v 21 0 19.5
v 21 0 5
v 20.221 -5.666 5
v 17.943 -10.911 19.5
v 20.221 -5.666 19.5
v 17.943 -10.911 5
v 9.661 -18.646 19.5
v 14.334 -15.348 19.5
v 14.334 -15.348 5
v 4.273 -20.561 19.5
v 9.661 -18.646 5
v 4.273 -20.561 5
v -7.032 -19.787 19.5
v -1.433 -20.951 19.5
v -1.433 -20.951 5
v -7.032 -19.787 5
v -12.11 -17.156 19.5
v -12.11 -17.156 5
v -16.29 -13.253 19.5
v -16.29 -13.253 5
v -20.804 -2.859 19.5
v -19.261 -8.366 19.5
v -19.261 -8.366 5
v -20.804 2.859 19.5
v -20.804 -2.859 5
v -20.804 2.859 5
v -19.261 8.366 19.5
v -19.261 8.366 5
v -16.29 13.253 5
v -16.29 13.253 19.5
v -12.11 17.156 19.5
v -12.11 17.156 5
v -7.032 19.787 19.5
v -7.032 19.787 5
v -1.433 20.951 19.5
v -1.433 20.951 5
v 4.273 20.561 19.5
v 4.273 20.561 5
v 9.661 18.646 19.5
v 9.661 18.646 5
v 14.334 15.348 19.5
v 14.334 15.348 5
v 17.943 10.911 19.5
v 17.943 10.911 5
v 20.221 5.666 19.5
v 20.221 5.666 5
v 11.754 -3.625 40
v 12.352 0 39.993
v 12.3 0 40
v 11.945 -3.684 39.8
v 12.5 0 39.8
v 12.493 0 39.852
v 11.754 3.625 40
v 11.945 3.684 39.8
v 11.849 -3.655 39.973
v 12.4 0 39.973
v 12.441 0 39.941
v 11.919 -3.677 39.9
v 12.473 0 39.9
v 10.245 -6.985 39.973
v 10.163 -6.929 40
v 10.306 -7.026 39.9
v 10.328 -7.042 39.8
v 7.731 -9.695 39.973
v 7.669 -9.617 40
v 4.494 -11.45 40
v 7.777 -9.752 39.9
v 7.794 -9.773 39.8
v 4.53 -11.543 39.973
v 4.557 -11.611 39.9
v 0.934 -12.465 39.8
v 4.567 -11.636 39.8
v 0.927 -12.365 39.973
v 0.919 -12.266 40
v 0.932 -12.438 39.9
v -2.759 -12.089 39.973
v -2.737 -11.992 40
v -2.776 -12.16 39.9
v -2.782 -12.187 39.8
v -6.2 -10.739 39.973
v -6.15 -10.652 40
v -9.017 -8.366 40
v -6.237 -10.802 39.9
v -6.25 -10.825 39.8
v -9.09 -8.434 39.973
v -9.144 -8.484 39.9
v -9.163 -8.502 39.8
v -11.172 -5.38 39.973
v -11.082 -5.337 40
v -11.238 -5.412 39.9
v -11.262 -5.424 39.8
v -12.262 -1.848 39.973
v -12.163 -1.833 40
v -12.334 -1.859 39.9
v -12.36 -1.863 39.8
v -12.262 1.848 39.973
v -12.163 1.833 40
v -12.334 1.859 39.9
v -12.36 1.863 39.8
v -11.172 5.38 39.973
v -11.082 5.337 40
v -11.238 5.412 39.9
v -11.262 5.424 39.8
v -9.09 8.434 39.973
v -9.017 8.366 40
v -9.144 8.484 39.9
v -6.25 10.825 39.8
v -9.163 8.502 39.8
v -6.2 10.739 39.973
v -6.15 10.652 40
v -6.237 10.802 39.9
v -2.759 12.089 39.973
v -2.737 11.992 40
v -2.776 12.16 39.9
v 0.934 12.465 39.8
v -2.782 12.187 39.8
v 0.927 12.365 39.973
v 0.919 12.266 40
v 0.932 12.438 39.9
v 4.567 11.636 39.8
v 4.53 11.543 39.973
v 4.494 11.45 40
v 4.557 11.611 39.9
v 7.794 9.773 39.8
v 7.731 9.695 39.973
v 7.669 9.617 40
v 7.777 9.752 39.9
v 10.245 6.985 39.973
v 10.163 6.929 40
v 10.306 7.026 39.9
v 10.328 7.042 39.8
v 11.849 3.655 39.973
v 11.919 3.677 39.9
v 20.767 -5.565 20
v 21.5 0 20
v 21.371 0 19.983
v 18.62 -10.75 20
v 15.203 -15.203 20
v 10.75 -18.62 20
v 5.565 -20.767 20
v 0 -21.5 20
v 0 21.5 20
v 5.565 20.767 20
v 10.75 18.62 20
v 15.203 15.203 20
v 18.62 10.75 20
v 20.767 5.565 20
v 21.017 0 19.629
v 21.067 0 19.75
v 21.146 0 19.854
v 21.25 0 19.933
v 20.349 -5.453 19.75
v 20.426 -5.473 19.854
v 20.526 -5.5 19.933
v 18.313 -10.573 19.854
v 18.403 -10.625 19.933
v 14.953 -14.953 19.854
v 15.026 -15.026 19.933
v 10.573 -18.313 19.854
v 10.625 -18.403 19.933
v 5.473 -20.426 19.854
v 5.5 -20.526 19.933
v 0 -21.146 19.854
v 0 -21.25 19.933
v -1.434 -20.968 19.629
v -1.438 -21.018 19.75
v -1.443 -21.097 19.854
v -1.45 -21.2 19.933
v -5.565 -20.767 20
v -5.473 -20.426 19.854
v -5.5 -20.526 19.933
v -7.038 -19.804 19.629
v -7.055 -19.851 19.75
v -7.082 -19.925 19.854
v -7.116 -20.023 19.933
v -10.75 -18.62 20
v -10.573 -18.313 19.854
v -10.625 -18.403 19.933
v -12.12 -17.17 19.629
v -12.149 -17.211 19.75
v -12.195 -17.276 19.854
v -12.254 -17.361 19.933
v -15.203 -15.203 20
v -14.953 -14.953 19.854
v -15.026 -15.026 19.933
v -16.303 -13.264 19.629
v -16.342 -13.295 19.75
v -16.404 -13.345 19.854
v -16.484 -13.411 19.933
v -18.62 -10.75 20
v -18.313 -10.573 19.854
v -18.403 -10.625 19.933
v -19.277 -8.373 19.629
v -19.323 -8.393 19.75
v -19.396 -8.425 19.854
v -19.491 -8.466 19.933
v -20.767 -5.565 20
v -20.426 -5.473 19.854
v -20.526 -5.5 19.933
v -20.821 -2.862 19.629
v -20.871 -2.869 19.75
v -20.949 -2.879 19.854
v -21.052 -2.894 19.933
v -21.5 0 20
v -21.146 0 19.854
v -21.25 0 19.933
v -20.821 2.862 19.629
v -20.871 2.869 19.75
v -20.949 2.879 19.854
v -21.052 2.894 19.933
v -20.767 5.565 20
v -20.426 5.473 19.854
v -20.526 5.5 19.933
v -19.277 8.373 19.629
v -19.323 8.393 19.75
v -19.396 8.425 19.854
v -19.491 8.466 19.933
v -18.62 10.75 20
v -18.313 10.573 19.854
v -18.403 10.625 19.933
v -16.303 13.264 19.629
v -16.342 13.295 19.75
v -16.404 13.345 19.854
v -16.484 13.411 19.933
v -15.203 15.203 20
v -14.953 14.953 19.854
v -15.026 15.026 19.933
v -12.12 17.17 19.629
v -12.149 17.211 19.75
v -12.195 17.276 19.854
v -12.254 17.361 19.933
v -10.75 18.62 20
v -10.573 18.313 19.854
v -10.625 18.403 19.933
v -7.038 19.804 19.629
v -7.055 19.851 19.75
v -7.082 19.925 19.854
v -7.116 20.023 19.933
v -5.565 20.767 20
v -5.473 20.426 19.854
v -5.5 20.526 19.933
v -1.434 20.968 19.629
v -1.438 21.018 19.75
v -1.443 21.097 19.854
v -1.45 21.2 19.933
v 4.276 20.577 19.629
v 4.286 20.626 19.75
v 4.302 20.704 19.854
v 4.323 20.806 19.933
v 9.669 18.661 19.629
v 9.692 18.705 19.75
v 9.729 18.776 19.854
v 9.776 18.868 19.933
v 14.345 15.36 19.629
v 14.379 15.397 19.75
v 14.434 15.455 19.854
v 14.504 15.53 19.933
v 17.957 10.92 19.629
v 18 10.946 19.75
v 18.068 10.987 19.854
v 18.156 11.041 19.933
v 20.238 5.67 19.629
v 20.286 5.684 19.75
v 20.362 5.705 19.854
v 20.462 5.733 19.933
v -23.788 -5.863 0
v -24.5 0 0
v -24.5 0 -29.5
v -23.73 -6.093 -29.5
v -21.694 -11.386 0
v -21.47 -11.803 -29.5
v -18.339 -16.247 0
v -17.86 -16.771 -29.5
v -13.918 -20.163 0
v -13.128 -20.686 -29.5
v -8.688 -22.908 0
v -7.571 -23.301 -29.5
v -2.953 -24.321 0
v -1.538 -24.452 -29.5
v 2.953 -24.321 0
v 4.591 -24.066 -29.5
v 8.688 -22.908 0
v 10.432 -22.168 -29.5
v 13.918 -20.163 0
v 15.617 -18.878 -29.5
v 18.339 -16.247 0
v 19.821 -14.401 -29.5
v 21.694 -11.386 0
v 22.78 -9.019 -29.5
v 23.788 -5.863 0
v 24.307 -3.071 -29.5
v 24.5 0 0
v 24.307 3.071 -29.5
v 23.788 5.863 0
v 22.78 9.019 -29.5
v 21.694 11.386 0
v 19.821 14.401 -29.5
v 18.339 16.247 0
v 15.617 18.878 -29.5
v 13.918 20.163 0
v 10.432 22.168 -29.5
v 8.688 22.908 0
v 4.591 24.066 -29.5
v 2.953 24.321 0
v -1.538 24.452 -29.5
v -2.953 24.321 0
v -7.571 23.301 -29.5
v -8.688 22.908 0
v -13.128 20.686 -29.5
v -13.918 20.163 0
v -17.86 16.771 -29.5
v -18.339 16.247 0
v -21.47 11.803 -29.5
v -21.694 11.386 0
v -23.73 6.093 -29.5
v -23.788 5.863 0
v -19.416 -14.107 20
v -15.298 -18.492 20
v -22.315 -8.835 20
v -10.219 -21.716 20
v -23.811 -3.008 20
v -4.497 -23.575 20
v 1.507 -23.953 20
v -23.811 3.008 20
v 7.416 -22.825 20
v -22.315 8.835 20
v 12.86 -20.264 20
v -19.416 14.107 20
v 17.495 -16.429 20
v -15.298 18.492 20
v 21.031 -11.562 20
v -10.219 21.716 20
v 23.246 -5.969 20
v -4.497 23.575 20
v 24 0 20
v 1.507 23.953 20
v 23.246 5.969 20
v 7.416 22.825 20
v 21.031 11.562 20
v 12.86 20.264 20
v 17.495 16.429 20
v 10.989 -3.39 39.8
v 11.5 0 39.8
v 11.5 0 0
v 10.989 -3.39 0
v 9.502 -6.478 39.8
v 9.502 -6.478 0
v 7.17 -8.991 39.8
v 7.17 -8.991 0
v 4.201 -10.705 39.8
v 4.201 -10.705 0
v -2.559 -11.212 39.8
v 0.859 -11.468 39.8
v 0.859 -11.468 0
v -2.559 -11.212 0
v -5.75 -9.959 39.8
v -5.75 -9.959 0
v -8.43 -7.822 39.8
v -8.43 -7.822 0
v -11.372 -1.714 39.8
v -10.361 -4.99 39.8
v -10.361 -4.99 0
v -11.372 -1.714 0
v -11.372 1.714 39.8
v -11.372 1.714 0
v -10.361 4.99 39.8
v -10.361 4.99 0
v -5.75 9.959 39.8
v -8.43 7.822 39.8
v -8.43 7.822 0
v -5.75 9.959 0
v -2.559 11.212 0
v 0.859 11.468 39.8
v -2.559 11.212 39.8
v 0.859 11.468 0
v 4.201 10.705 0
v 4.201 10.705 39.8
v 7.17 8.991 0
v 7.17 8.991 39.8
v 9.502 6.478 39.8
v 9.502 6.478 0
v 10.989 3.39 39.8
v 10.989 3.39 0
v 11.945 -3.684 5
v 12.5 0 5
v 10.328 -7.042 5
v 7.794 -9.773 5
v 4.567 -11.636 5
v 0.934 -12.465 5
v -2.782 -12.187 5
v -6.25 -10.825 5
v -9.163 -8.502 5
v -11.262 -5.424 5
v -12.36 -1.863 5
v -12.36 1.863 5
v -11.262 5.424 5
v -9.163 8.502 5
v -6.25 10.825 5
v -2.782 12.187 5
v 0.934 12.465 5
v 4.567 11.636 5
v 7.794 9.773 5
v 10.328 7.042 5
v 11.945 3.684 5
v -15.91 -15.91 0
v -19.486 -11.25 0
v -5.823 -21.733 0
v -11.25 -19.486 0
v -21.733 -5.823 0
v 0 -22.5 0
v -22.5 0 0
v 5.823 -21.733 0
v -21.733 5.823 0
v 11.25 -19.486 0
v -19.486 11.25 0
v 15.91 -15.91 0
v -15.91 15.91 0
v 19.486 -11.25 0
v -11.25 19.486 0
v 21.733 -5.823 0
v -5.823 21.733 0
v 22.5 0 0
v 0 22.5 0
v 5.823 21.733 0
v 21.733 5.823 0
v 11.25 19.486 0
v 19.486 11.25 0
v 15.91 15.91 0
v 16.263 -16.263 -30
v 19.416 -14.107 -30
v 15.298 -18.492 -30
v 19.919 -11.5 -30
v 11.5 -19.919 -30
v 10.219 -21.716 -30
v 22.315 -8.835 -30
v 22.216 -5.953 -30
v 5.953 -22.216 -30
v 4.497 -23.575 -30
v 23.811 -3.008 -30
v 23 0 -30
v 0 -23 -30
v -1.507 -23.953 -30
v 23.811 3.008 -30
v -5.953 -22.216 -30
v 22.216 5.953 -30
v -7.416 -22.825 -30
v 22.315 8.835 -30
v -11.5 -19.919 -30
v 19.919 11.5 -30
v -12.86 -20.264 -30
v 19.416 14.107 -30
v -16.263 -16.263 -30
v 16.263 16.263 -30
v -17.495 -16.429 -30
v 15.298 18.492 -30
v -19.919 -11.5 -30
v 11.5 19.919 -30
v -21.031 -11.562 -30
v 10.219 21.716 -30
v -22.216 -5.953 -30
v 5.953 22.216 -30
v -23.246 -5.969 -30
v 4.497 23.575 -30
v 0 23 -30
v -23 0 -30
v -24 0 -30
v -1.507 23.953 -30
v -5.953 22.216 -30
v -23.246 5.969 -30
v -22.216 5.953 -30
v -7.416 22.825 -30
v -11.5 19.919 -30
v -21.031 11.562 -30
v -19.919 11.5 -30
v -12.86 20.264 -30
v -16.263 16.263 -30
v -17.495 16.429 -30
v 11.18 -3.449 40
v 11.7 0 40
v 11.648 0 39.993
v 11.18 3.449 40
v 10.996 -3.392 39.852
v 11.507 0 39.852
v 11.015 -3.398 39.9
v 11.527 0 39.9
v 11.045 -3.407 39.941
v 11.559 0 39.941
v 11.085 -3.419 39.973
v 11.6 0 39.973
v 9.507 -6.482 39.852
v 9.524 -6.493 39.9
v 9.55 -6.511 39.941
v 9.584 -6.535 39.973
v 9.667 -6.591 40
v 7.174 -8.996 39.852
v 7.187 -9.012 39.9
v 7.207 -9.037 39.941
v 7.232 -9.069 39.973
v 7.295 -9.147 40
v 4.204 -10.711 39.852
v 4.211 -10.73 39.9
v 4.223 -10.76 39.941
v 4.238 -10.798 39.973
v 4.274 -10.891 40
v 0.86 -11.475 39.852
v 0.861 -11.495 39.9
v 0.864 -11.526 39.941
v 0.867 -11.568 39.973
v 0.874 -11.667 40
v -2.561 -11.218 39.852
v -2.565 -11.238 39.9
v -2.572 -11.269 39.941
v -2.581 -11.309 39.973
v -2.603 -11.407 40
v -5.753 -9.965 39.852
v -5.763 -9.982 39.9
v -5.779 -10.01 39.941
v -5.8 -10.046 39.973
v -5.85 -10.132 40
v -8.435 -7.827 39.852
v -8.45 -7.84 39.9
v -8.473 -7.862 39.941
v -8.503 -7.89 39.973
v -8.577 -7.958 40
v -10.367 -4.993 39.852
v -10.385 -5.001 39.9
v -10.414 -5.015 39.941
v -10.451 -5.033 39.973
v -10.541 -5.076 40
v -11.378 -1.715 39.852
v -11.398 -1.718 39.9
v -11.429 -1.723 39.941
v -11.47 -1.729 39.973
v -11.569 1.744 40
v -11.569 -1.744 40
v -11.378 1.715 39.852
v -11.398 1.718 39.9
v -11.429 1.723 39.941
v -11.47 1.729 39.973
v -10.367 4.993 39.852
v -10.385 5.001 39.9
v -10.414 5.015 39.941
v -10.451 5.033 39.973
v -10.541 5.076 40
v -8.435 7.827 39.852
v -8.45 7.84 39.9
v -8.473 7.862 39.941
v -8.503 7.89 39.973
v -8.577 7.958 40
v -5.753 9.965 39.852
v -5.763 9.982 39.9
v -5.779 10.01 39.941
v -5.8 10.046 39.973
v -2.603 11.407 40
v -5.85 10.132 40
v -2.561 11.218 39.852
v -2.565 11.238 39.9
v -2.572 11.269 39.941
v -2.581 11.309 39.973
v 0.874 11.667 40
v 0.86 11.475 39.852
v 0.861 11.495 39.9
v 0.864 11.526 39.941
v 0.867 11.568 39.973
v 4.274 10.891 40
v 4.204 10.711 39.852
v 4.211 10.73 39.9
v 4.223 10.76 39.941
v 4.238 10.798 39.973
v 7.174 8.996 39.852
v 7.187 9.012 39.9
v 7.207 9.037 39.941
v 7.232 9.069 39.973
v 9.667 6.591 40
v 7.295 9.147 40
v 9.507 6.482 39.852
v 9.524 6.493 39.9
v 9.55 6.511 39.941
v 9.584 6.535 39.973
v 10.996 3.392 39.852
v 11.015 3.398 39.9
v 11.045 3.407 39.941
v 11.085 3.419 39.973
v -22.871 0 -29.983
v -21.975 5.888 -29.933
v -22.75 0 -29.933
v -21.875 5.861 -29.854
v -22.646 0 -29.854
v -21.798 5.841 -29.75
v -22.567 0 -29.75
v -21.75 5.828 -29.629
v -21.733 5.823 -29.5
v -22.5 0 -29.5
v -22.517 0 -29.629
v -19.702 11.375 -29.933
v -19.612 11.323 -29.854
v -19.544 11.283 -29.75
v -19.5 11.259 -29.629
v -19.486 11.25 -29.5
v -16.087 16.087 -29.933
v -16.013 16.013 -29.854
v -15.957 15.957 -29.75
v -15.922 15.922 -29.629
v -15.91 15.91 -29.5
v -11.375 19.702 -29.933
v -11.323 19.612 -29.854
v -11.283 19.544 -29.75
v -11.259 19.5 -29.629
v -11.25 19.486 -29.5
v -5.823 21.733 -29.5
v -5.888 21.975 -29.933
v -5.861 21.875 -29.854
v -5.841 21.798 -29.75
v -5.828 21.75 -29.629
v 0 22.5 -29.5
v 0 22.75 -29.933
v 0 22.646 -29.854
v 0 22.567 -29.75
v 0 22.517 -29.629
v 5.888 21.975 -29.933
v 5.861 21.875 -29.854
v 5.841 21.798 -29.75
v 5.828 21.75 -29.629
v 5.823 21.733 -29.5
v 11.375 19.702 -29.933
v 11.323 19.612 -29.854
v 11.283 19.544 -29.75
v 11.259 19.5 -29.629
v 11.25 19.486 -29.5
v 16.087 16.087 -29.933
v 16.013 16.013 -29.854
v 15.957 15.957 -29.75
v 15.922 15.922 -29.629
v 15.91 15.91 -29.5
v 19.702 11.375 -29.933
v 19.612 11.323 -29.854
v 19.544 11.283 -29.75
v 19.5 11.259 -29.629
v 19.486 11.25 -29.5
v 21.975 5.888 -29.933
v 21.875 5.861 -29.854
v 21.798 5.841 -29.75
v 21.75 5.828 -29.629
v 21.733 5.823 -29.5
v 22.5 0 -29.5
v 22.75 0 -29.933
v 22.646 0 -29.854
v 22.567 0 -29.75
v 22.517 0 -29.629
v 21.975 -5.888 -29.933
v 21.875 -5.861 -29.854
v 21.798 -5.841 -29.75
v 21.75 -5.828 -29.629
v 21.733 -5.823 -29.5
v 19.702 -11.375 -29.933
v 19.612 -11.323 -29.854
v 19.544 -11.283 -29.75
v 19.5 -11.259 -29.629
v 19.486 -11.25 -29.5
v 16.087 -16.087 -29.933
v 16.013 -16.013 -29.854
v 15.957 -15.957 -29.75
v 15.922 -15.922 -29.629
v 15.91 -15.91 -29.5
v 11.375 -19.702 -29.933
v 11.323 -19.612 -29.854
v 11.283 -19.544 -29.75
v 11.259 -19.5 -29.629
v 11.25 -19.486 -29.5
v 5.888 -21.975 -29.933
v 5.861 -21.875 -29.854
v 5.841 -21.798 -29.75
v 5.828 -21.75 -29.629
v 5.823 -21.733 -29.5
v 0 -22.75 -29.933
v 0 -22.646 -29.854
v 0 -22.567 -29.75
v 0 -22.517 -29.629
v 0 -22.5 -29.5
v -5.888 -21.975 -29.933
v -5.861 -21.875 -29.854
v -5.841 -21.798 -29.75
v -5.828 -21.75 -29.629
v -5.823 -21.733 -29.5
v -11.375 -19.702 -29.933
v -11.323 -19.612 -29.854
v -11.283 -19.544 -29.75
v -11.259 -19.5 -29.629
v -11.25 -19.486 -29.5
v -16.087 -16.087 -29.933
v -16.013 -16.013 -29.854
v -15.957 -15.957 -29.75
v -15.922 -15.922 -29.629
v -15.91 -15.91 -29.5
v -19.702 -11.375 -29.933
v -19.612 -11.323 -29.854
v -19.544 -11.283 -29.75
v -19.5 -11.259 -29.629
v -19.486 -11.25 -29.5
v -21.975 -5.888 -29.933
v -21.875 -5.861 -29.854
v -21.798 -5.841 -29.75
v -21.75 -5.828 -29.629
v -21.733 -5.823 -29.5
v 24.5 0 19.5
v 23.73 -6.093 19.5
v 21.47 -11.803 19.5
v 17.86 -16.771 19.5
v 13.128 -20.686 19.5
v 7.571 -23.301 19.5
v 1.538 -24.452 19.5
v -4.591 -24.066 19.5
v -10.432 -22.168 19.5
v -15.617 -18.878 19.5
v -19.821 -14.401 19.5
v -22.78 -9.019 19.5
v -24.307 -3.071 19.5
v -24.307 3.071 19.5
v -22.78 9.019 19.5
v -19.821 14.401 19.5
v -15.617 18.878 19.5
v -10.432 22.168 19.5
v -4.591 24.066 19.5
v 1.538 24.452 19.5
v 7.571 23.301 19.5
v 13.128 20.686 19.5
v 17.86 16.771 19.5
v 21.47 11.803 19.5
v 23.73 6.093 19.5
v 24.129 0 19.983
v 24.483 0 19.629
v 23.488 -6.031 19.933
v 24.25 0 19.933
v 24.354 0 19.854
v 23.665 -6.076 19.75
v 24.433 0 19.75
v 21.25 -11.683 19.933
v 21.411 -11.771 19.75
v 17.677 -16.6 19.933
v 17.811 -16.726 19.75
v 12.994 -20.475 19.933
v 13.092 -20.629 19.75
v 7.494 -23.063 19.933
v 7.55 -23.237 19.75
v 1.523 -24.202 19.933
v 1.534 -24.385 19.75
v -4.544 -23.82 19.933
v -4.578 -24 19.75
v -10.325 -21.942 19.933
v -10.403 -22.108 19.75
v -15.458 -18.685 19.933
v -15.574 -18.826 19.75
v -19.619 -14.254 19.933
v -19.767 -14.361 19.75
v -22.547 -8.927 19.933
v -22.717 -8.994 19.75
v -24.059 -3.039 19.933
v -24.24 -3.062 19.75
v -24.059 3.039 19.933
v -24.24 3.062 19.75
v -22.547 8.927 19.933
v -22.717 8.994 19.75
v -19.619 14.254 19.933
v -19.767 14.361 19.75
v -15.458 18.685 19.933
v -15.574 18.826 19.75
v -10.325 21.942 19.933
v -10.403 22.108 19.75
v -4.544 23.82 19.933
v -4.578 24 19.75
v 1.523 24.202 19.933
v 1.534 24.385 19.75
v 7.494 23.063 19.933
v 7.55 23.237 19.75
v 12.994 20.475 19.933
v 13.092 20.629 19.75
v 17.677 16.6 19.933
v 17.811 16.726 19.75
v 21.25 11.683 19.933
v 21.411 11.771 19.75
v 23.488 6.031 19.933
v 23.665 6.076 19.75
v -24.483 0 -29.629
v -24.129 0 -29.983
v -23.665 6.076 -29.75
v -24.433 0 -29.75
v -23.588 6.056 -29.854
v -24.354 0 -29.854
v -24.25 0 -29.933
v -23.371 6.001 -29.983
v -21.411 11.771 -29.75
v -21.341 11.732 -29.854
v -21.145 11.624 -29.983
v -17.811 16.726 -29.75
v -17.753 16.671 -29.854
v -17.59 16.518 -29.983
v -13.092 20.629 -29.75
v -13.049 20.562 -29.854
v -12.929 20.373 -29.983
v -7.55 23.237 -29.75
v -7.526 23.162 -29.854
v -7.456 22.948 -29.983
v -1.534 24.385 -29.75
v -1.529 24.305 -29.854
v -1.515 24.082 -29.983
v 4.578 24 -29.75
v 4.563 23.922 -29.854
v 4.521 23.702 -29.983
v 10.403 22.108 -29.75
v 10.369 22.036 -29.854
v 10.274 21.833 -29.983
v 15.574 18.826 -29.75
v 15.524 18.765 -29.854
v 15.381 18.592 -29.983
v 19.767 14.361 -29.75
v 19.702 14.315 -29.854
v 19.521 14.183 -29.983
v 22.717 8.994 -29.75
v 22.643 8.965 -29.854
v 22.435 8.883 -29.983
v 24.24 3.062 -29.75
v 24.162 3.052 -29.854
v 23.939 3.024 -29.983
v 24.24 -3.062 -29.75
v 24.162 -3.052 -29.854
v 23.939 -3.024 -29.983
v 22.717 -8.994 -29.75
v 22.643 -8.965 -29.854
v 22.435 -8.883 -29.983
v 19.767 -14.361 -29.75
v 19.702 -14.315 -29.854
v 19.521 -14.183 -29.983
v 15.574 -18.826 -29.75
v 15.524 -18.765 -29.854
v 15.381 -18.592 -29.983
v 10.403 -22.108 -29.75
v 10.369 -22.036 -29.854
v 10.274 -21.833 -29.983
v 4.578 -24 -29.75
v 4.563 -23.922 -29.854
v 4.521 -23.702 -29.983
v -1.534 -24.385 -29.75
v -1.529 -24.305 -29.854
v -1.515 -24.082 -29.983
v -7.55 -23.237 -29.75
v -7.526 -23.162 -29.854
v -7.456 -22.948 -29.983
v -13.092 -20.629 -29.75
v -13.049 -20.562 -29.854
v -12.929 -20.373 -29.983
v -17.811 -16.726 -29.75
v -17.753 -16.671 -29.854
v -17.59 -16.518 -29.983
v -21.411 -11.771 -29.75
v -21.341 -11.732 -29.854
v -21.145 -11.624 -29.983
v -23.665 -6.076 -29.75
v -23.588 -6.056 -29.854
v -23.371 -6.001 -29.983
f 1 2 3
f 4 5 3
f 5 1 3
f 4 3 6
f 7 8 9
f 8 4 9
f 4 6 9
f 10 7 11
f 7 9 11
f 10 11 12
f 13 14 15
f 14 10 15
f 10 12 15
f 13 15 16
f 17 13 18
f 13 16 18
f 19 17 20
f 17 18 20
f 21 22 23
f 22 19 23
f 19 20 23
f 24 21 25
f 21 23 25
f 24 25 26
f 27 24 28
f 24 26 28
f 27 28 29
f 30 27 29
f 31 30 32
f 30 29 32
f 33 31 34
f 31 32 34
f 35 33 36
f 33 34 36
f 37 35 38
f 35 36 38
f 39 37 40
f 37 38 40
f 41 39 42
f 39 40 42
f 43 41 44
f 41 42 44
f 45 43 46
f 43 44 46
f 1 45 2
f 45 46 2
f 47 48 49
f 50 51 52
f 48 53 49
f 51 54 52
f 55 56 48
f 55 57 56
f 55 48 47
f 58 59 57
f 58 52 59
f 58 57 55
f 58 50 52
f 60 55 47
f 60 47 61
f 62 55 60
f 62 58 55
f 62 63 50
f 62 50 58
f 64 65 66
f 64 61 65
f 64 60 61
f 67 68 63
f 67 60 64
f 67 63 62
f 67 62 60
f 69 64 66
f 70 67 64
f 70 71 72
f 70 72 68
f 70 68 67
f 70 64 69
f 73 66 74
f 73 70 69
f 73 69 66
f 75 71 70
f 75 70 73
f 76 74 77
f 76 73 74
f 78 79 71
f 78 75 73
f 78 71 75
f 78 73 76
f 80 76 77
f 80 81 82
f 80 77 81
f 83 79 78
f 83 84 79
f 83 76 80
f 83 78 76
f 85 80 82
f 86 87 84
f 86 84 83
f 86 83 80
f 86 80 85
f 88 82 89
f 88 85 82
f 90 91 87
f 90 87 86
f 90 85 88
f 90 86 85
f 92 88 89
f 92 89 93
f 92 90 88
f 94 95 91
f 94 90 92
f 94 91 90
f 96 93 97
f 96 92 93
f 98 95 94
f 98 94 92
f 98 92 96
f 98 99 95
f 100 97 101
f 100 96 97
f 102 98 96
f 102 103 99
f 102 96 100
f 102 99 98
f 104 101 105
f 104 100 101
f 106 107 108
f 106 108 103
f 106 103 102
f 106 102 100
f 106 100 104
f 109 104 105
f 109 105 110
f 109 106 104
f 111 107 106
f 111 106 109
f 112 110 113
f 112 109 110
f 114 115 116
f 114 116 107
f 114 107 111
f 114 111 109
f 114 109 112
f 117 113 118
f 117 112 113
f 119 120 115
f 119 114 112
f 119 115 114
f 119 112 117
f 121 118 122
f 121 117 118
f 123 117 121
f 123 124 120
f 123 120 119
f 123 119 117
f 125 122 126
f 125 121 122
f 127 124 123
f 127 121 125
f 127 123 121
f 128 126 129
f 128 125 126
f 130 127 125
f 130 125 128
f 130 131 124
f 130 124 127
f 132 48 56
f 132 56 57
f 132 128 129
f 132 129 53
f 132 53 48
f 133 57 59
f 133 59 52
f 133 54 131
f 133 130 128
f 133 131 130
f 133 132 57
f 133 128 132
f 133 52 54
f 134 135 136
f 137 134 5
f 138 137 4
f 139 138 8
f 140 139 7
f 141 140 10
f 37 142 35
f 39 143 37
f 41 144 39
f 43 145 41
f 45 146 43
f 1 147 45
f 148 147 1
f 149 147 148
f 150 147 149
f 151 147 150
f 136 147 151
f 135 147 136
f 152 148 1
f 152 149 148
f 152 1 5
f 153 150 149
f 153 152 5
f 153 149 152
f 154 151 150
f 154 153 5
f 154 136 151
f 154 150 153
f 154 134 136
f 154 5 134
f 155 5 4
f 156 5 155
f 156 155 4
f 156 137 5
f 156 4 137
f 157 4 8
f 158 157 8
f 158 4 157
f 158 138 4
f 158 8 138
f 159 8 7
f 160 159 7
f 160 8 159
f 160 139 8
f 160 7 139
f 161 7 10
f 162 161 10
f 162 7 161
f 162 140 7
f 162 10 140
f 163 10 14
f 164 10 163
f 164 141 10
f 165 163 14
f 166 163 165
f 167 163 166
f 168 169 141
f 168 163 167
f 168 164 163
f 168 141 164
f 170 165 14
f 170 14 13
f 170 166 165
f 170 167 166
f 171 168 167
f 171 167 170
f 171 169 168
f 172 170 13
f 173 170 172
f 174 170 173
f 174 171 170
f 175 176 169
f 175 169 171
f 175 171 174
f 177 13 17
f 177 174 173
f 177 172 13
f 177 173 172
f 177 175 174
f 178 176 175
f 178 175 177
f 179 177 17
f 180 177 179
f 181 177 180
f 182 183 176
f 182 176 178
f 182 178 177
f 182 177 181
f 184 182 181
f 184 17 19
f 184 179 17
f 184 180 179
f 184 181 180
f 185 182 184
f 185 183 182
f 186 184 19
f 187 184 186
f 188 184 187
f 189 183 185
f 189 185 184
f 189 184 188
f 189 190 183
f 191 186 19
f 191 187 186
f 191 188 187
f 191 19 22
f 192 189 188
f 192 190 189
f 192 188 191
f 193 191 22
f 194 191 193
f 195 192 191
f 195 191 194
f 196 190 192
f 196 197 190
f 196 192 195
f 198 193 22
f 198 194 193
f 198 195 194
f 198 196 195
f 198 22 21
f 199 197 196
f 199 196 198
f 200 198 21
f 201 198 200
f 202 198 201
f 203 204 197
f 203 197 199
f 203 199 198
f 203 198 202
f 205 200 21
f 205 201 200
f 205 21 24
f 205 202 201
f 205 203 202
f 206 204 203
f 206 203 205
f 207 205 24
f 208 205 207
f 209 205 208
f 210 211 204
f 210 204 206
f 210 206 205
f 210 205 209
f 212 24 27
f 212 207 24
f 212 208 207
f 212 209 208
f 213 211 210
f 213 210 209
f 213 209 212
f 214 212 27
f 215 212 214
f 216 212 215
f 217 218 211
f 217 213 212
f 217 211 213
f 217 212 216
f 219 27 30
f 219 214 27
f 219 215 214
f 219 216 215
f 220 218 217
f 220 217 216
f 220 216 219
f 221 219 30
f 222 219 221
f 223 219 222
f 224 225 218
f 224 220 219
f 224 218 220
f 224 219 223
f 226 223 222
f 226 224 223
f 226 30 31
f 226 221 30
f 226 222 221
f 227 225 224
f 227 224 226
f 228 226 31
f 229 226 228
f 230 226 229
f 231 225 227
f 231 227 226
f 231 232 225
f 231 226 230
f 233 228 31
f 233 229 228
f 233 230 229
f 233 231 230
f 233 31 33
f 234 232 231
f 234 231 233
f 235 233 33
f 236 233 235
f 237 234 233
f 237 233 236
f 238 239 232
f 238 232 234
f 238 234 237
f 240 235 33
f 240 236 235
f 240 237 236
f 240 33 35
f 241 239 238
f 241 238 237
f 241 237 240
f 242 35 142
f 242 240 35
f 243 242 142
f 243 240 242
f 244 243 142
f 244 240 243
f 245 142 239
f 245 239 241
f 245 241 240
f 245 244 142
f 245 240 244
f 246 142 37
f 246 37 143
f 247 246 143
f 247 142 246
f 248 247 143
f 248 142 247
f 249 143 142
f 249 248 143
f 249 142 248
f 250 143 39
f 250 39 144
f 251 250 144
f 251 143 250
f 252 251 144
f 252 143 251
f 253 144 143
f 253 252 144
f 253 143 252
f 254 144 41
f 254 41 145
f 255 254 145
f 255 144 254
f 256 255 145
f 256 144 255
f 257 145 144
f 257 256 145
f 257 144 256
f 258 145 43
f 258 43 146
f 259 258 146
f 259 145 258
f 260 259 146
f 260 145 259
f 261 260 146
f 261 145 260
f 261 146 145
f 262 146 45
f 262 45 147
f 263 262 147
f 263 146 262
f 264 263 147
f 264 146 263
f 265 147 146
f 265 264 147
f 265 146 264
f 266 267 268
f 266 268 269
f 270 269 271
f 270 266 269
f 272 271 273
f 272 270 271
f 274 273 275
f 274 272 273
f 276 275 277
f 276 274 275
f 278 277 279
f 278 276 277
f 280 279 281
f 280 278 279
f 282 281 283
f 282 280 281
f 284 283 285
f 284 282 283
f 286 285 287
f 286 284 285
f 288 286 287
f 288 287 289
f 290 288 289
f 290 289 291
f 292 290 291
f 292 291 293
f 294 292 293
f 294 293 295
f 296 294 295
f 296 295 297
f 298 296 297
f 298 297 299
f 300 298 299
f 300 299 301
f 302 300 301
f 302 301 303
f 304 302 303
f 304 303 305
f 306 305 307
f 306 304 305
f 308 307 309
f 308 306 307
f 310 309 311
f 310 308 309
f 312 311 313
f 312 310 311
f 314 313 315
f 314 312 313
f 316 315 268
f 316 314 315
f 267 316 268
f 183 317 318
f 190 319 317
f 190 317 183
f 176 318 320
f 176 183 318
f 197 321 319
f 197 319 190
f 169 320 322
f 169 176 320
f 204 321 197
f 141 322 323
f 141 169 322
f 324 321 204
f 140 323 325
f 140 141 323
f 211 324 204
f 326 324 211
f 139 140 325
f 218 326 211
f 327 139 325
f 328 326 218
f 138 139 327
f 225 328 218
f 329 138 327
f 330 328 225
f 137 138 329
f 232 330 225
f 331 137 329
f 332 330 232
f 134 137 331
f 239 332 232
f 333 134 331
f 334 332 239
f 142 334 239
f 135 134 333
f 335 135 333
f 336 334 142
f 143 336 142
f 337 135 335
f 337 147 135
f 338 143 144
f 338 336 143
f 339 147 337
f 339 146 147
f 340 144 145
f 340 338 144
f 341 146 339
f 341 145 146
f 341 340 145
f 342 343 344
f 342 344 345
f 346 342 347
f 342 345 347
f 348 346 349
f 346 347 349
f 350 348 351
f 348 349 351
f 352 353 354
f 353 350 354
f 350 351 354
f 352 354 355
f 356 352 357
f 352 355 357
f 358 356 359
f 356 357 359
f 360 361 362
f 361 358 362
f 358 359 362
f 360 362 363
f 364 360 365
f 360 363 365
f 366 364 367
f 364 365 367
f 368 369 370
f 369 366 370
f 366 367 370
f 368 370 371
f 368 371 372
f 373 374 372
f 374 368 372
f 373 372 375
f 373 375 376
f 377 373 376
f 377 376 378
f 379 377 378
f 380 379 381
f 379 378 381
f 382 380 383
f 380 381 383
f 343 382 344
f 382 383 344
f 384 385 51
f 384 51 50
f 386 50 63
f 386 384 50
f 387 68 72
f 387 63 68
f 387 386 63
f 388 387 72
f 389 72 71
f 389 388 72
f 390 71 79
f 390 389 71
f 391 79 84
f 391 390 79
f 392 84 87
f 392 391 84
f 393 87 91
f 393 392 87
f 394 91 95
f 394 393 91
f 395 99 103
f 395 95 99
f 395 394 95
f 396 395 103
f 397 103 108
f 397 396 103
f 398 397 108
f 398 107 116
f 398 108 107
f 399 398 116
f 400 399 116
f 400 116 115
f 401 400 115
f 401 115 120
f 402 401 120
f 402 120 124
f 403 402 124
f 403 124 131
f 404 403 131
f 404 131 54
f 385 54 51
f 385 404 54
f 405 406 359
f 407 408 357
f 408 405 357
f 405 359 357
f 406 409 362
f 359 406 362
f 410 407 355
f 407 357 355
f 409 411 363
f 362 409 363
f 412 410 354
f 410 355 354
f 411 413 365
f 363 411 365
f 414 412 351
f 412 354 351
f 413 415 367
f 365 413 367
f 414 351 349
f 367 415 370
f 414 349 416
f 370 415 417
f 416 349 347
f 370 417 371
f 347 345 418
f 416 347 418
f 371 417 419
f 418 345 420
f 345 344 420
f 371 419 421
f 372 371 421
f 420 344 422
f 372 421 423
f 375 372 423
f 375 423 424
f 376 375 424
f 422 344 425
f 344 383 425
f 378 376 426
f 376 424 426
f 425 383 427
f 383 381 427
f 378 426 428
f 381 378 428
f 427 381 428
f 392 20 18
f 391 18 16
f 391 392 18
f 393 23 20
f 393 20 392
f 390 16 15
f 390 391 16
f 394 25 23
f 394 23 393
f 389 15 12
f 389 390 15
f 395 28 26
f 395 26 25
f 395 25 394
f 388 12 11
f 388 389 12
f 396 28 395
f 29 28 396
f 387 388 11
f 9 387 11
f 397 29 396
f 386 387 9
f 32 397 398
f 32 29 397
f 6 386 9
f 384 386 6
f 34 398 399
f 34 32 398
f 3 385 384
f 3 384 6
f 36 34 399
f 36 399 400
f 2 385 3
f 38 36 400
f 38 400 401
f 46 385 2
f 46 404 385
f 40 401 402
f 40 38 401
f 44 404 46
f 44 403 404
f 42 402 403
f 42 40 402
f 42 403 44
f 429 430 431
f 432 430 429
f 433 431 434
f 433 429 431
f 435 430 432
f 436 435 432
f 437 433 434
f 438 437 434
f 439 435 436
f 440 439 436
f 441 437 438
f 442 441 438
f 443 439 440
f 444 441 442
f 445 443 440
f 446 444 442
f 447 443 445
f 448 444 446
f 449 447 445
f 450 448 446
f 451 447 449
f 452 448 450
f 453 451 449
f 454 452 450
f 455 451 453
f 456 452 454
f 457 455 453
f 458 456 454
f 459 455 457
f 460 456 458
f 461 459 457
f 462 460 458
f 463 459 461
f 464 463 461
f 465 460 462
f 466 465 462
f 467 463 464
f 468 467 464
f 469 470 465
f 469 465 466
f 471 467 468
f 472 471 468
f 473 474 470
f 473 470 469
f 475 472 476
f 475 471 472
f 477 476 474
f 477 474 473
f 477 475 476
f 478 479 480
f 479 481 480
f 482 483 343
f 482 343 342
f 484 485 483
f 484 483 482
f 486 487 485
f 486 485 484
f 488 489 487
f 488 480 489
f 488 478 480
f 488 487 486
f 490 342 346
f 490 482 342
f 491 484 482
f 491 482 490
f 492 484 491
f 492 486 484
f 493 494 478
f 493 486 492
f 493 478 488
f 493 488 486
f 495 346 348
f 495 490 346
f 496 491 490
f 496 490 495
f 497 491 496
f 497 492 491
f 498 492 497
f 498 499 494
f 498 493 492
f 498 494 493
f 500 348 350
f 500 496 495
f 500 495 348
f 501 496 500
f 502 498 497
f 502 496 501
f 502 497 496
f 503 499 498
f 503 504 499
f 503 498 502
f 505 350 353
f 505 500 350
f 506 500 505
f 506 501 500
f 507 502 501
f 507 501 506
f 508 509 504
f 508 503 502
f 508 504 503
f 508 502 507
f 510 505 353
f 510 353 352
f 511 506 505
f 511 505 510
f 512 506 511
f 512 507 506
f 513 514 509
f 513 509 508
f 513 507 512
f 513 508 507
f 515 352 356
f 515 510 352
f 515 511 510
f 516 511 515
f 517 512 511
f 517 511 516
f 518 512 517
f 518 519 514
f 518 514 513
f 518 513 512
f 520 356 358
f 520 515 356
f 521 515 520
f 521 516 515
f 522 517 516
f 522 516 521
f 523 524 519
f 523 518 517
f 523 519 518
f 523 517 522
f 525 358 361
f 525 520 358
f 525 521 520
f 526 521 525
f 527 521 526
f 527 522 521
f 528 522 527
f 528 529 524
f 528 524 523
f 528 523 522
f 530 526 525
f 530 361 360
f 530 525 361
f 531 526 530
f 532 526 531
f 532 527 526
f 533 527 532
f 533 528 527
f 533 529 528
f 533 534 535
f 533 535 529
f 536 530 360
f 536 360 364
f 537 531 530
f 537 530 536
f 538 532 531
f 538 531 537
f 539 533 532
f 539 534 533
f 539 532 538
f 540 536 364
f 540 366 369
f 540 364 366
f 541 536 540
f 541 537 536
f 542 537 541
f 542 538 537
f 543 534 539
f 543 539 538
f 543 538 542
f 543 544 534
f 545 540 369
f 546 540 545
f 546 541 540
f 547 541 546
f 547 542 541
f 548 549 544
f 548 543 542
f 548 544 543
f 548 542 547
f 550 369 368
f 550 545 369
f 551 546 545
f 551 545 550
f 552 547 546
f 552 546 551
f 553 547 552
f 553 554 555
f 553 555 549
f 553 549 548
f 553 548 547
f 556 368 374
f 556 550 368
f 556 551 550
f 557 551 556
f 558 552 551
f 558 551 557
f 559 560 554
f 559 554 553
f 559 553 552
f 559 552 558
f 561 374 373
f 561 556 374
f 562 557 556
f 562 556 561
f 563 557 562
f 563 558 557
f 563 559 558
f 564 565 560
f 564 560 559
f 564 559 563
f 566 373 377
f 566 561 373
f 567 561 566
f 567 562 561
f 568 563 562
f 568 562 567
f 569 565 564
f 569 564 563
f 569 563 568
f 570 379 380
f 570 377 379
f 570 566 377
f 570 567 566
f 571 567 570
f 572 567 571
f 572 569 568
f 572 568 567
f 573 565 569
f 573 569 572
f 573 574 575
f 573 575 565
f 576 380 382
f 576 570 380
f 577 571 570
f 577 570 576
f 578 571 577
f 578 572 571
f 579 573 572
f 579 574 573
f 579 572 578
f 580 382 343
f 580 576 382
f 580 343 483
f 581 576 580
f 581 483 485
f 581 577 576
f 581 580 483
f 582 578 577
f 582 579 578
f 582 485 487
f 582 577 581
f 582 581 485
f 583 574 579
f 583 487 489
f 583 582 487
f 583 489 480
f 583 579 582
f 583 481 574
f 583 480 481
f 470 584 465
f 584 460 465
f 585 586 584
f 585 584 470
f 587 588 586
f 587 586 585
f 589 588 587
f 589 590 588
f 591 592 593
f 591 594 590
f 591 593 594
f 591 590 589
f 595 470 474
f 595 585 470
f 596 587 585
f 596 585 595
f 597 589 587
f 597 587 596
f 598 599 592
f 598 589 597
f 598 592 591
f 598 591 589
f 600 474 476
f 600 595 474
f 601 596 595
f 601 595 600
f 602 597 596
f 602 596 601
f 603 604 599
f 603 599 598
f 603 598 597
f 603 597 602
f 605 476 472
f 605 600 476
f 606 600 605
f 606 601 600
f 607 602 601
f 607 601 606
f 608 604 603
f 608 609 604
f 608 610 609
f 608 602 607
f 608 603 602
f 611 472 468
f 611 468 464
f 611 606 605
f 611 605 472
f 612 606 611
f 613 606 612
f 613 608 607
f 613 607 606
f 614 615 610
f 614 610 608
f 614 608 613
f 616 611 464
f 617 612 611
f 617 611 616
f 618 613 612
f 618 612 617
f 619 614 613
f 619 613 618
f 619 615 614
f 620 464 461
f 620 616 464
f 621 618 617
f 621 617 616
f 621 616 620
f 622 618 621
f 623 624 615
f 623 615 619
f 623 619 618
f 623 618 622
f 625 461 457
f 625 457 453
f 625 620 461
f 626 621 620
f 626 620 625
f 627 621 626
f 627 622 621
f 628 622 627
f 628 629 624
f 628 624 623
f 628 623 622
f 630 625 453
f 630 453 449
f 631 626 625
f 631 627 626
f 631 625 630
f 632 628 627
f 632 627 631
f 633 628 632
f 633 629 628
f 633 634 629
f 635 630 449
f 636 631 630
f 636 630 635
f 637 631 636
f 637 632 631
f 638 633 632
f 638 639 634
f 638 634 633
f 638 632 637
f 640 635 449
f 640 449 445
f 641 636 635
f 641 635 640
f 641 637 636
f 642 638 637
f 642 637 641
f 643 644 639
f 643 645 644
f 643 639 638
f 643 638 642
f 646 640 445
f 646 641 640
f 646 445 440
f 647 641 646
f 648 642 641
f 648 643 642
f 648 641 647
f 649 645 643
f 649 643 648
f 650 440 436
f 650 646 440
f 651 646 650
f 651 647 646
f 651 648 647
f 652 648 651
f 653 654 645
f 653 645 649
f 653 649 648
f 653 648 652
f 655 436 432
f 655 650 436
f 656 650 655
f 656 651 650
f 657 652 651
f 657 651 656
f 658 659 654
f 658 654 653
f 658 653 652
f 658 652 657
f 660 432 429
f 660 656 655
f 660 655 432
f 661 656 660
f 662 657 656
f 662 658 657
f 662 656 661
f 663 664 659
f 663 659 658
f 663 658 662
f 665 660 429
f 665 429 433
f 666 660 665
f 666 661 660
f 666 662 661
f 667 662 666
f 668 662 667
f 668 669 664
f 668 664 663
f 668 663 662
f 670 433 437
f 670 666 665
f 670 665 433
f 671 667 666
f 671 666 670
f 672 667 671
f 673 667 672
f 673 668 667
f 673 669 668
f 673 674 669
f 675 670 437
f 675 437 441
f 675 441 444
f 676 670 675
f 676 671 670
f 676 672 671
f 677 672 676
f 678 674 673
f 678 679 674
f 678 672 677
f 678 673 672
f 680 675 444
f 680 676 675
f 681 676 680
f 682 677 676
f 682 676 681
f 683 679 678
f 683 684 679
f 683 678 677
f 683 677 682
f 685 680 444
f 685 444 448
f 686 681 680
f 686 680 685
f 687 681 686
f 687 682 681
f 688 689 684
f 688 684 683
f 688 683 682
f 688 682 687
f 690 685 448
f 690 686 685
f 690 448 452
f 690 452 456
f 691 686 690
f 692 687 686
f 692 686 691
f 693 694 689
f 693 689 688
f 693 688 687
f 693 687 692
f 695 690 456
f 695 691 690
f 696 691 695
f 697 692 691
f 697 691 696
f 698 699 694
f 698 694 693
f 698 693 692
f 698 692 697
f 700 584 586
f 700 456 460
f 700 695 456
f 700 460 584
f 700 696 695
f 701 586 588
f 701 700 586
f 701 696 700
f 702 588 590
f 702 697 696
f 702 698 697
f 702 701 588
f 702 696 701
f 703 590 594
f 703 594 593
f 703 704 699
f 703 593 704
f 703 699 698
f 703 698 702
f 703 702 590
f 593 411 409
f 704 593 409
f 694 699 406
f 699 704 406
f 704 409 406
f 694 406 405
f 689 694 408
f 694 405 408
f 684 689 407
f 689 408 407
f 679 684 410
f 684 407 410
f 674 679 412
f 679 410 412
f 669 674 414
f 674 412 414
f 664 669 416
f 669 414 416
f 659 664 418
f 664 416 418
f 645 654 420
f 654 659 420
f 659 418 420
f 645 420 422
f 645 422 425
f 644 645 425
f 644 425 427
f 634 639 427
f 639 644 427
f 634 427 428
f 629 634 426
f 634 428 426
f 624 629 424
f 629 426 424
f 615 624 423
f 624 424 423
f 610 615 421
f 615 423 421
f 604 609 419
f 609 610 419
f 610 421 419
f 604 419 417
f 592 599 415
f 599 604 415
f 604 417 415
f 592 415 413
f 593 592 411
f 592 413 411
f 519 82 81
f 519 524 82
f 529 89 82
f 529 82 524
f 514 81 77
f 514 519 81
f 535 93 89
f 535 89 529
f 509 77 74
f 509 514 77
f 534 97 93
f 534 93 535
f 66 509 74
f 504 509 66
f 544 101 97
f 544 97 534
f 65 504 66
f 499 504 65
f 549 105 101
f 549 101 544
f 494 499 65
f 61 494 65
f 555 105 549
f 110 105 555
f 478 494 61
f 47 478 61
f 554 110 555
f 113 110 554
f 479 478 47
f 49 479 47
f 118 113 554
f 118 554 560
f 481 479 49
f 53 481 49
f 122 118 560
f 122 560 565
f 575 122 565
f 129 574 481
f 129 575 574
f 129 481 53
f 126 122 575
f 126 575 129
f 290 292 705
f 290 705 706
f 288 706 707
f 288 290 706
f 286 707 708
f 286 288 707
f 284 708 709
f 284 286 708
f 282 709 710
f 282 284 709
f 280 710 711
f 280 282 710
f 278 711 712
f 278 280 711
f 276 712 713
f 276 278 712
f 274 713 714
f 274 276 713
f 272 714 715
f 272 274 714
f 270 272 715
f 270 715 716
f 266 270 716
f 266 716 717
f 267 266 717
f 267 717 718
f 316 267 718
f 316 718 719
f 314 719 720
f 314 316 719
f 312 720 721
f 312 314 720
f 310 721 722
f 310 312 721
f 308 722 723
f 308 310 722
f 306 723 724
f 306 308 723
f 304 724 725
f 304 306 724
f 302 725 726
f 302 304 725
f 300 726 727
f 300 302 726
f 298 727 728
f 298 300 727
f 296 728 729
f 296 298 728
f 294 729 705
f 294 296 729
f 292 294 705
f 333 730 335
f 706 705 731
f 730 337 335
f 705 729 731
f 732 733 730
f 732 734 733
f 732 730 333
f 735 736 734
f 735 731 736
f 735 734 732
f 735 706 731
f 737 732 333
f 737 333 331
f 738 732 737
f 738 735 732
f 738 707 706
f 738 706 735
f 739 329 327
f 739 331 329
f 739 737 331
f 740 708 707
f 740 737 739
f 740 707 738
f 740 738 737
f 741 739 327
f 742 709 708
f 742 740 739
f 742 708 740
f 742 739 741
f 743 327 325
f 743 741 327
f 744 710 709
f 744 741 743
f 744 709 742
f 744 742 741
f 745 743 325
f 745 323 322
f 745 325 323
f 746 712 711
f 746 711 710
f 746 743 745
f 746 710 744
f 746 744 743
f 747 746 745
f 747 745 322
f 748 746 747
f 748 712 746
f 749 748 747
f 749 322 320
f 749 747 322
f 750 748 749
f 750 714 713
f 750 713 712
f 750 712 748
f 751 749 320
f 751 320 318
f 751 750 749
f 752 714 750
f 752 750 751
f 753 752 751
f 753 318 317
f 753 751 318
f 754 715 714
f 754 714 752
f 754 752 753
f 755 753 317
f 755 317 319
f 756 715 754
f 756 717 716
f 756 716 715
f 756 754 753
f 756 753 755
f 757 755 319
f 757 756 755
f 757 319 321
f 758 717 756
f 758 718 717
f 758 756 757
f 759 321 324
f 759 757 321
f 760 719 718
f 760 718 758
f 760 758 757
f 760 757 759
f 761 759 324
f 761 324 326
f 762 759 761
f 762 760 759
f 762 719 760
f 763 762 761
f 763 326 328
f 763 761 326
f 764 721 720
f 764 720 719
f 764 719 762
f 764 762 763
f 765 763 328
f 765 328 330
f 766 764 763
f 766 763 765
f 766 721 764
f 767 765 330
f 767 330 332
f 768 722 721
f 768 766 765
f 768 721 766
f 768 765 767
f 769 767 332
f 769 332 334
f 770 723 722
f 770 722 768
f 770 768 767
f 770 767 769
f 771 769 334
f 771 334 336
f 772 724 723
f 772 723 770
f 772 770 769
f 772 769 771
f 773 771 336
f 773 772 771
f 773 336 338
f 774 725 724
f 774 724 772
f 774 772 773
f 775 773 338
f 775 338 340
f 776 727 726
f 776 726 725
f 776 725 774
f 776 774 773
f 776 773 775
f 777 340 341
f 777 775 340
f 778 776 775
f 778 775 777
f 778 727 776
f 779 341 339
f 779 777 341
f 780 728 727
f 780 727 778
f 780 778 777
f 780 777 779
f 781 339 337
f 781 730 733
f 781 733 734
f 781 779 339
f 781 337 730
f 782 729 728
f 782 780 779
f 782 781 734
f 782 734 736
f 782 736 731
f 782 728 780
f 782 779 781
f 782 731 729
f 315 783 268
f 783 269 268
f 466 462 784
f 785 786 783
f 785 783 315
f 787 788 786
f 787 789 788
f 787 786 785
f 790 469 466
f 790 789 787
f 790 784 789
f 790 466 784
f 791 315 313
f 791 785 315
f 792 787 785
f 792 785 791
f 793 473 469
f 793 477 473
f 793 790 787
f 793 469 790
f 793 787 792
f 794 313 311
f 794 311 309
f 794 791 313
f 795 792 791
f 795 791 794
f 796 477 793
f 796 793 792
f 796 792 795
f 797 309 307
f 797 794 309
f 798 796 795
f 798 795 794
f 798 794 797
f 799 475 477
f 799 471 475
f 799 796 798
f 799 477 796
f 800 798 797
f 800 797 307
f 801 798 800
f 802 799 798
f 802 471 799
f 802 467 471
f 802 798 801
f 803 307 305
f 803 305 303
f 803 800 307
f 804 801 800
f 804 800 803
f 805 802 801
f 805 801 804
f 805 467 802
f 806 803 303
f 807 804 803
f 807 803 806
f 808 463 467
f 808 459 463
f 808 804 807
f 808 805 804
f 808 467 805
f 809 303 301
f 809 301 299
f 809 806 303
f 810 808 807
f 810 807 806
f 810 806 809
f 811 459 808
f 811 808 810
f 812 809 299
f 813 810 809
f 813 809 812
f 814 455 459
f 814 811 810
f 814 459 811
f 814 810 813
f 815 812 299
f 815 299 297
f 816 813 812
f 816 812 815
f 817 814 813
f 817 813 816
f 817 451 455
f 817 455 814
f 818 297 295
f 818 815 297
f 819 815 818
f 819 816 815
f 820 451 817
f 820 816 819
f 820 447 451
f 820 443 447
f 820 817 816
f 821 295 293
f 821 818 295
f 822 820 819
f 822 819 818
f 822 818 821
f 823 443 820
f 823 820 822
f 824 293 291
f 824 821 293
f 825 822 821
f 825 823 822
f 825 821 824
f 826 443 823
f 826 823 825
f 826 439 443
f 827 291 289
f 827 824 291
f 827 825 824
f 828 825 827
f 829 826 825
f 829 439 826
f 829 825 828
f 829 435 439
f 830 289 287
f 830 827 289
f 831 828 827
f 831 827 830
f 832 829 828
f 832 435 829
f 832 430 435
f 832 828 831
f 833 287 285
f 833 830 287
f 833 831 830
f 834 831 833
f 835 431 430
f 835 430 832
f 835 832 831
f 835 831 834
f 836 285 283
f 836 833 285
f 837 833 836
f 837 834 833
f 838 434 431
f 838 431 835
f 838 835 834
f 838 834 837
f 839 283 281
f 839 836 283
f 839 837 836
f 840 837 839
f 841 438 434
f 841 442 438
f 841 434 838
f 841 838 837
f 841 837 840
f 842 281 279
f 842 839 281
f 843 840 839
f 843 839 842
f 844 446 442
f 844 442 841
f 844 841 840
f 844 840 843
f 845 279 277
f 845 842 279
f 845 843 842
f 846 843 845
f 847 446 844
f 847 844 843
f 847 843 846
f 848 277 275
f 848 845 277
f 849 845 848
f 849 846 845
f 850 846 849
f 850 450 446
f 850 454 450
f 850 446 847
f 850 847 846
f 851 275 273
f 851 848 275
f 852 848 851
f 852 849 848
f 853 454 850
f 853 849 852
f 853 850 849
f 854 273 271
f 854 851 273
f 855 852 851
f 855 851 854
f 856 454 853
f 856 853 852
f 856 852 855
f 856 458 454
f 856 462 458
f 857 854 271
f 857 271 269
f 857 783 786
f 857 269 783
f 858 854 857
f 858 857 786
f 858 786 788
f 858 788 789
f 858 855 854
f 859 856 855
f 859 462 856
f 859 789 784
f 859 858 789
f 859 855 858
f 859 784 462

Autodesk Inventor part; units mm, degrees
ref_plane "YZ Plane" through (0, 0, 0) normal (1, 0, 0) x (0, 1, 0)
ref_plane "XZ Plane" through (0, 0, 0) normal (0, 1, 0) x (-1, 0, 0)
ref_plane "XY Plane" through (0, 0, 0) normal (0, 0, 1) x (1, 0, 0)
sketch "Sketch1" plane through (0, 0, 0) normal (0, 0, 1) x (1, 0, 0)
  circle A0 centre (0, 0) radius 12.5
  circle A1 centre (0, 0) radius 11.5
  circle A2 centre (0, 0) radius 24.5
  circle A3 centre (0, 0) radius 21
  dimension "d0" = 25
  dimension "d1" = 23
  dimension "d2" = 49
  dimension "d3" = 42
extrude "Extrusion1" add sketch "Sketch1" along normal blind 40 contours A0
extrude "Extrusion2" add sketch "Sketch1" along normal blind 20 contours A2
extrude "Extrusion3" add sketch "Sketch1" along normal blind 5 contours A3
fillet "Fillet1" radius 0.5 2 edges at (-21, 0, 20) (-24.5, 0, 20)
sketch "Sketch2" plane through (0, 0, 0) normal (0, 0, -1) x (-1, 0, 0)
  circle A0 centre (0, 0) radius 24.5
  circle A1 centre (0, 0) radius 22.5
  dimension "d11" = 49
  dimension "d12" = 45
extrude "Extrusion4" add sketch "Sketch2" along normal blind 30
fillet "Fillet2" radius 0.5 2 edges at (24.5, 0, -30) (22.5, 0, -30)
fillet "Fillet3" radius 0.2 2 edges at (-12.5, 0, 40) (-11.5, 0, 40)
equation "\"BendRadius\" = Thickness"
equation "\"BendReliefWidth\" = Thickness"
equation "\"BendReliefDepth\" = 0.5 * Thickness"
equation "\"CornerReliefSize\" = 4 * Thickness"
equation "\"MinimumRemnant\" = 2 * Thickness"
equation "\"TransitionRadius\" = BendRadius"
equation "\"JacobiRadiusSize\" = BendRadius"
equation "\"GapSize\" = Thickness"
equation "\"Thickness\" = 0.5"
